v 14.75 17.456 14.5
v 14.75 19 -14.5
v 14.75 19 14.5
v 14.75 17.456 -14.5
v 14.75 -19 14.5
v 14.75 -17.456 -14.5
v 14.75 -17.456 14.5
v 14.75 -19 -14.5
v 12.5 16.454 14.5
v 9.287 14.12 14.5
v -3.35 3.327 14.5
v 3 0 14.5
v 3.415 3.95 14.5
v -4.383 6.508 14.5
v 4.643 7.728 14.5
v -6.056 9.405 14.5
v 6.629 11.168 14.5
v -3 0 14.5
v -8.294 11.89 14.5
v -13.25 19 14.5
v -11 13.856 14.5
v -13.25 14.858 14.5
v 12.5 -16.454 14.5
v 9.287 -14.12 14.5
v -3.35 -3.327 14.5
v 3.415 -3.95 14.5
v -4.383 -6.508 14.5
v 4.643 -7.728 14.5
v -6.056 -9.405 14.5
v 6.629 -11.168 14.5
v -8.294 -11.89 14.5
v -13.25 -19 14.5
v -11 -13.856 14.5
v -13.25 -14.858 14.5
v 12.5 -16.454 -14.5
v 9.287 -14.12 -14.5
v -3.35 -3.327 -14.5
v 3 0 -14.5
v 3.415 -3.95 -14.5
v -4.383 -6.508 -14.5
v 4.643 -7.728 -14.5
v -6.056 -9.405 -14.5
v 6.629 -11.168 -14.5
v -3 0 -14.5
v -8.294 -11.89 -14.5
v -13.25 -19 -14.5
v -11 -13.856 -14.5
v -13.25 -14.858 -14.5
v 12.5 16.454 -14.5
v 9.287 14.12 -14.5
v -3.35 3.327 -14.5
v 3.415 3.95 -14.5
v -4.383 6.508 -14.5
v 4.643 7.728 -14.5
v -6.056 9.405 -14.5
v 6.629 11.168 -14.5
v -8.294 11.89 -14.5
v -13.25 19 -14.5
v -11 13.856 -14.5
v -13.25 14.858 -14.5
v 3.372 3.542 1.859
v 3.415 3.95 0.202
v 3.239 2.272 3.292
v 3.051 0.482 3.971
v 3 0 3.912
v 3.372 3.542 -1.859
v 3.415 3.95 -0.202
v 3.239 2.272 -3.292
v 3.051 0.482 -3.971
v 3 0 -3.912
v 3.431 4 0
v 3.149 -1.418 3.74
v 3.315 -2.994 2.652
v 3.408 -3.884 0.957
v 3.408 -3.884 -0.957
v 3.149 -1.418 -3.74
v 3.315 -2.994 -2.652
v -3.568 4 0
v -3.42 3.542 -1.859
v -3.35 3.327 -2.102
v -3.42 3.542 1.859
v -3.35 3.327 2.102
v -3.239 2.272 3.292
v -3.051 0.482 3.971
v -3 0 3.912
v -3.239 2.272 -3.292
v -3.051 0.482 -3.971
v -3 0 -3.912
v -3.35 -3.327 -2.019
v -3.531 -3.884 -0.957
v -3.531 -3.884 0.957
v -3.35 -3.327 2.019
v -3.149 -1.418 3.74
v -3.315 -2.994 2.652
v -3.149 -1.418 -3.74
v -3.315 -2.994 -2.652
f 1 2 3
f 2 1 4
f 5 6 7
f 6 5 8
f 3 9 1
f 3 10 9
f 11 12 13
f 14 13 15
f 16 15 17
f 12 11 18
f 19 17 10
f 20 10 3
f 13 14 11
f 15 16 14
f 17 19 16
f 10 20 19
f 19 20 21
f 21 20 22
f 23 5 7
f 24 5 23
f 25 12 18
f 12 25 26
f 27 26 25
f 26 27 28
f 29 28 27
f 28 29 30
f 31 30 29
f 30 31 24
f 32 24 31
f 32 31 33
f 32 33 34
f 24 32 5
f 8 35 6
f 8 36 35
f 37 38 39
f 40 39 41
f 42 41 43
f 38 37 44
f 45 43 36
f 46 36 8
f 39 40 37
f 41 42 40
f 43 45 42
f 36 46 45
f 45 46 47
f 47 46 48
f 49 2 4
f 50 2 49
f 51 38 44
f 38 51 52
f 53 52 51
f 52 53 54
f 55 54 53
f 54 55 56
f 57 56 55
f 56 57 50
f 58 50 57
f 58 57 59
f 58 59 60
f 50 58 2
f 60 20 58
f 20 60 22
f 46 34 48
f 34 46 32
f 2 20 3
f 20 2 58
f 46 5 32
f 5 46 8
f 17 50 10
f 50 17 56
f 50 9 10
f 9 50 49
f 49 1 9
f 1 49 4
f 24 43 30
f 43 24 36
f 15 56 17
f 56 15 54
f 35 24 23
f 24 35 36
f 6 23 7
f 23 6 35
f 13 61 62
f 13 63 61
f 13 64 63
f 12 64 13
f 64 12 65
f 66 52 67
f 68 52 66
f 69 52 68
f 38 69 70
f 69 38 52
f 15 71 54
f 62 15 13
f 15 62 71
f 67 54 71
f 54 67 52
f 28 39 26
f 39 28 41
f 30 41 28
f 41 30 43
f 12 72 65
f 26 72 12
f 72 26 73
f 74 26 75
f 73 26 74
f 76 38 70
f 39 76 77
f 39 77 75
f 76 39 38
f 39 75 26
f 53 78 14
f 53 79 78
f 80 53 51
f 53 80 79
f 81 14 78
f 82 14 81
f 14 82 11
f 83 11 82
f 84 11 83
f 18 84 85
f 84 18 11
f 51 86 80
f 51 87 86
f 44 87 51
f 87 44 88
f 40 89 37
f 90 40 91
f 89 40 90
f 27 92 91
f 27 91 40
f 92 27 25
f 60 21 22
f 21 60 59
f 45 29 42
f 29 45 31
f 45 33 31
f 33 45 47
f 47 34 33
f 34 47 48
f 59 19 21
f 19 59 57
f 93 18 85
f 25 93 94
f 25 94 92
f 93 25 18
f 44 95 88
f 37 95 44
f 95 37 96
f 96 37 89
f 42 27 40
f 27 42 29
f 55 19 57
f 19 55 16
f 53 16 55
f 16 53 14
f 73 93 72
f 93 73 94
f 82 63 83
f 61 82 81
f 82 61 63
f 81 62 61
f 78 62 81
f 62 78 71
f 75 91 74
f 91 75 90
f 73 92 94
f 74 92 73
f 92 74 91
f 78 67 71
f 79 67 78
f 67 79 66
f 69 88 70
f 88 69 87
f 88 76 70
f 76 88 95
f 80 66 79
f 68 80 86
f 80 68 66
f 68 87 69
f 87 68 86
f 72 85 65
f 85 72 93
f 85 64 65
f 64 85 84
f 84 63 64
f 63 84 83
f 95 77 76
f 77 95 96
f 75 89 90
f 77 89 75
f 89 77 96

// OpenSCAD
// [FL_INDEX: keywords="openscad, 3d_parametric, Parametric_Pipe_clamp_spacer, csg_solid" | COT="Parametric OpenSCAD design from 3DCodeverse"]
// Title: Parametric Pipe clamp/spacer 

radius1 = 19;
radius2 = 16;
separation = 6;
height = 30;
hole1 = 4;
module trampclamp()
{
	
		
	difference() {
		translate([0.25*(radius1-radius2), 0, 0])
		cube([0.8*(radius1 + radius2),2*radius1 , height-1 ], center = true);
		translate([radius1+separation/2, 0, 0])
		cylinder(h = height, r = radius1, center = true);	
		translate([-(radius2+separation/2), 0, 0])
		cylinder(h = height, r = radius2, center = true);	
		rotate([90,0,90])
		cylinder(h = separation*2, r = hole1, center = true);
				
	}
		
}

trampclamp();
